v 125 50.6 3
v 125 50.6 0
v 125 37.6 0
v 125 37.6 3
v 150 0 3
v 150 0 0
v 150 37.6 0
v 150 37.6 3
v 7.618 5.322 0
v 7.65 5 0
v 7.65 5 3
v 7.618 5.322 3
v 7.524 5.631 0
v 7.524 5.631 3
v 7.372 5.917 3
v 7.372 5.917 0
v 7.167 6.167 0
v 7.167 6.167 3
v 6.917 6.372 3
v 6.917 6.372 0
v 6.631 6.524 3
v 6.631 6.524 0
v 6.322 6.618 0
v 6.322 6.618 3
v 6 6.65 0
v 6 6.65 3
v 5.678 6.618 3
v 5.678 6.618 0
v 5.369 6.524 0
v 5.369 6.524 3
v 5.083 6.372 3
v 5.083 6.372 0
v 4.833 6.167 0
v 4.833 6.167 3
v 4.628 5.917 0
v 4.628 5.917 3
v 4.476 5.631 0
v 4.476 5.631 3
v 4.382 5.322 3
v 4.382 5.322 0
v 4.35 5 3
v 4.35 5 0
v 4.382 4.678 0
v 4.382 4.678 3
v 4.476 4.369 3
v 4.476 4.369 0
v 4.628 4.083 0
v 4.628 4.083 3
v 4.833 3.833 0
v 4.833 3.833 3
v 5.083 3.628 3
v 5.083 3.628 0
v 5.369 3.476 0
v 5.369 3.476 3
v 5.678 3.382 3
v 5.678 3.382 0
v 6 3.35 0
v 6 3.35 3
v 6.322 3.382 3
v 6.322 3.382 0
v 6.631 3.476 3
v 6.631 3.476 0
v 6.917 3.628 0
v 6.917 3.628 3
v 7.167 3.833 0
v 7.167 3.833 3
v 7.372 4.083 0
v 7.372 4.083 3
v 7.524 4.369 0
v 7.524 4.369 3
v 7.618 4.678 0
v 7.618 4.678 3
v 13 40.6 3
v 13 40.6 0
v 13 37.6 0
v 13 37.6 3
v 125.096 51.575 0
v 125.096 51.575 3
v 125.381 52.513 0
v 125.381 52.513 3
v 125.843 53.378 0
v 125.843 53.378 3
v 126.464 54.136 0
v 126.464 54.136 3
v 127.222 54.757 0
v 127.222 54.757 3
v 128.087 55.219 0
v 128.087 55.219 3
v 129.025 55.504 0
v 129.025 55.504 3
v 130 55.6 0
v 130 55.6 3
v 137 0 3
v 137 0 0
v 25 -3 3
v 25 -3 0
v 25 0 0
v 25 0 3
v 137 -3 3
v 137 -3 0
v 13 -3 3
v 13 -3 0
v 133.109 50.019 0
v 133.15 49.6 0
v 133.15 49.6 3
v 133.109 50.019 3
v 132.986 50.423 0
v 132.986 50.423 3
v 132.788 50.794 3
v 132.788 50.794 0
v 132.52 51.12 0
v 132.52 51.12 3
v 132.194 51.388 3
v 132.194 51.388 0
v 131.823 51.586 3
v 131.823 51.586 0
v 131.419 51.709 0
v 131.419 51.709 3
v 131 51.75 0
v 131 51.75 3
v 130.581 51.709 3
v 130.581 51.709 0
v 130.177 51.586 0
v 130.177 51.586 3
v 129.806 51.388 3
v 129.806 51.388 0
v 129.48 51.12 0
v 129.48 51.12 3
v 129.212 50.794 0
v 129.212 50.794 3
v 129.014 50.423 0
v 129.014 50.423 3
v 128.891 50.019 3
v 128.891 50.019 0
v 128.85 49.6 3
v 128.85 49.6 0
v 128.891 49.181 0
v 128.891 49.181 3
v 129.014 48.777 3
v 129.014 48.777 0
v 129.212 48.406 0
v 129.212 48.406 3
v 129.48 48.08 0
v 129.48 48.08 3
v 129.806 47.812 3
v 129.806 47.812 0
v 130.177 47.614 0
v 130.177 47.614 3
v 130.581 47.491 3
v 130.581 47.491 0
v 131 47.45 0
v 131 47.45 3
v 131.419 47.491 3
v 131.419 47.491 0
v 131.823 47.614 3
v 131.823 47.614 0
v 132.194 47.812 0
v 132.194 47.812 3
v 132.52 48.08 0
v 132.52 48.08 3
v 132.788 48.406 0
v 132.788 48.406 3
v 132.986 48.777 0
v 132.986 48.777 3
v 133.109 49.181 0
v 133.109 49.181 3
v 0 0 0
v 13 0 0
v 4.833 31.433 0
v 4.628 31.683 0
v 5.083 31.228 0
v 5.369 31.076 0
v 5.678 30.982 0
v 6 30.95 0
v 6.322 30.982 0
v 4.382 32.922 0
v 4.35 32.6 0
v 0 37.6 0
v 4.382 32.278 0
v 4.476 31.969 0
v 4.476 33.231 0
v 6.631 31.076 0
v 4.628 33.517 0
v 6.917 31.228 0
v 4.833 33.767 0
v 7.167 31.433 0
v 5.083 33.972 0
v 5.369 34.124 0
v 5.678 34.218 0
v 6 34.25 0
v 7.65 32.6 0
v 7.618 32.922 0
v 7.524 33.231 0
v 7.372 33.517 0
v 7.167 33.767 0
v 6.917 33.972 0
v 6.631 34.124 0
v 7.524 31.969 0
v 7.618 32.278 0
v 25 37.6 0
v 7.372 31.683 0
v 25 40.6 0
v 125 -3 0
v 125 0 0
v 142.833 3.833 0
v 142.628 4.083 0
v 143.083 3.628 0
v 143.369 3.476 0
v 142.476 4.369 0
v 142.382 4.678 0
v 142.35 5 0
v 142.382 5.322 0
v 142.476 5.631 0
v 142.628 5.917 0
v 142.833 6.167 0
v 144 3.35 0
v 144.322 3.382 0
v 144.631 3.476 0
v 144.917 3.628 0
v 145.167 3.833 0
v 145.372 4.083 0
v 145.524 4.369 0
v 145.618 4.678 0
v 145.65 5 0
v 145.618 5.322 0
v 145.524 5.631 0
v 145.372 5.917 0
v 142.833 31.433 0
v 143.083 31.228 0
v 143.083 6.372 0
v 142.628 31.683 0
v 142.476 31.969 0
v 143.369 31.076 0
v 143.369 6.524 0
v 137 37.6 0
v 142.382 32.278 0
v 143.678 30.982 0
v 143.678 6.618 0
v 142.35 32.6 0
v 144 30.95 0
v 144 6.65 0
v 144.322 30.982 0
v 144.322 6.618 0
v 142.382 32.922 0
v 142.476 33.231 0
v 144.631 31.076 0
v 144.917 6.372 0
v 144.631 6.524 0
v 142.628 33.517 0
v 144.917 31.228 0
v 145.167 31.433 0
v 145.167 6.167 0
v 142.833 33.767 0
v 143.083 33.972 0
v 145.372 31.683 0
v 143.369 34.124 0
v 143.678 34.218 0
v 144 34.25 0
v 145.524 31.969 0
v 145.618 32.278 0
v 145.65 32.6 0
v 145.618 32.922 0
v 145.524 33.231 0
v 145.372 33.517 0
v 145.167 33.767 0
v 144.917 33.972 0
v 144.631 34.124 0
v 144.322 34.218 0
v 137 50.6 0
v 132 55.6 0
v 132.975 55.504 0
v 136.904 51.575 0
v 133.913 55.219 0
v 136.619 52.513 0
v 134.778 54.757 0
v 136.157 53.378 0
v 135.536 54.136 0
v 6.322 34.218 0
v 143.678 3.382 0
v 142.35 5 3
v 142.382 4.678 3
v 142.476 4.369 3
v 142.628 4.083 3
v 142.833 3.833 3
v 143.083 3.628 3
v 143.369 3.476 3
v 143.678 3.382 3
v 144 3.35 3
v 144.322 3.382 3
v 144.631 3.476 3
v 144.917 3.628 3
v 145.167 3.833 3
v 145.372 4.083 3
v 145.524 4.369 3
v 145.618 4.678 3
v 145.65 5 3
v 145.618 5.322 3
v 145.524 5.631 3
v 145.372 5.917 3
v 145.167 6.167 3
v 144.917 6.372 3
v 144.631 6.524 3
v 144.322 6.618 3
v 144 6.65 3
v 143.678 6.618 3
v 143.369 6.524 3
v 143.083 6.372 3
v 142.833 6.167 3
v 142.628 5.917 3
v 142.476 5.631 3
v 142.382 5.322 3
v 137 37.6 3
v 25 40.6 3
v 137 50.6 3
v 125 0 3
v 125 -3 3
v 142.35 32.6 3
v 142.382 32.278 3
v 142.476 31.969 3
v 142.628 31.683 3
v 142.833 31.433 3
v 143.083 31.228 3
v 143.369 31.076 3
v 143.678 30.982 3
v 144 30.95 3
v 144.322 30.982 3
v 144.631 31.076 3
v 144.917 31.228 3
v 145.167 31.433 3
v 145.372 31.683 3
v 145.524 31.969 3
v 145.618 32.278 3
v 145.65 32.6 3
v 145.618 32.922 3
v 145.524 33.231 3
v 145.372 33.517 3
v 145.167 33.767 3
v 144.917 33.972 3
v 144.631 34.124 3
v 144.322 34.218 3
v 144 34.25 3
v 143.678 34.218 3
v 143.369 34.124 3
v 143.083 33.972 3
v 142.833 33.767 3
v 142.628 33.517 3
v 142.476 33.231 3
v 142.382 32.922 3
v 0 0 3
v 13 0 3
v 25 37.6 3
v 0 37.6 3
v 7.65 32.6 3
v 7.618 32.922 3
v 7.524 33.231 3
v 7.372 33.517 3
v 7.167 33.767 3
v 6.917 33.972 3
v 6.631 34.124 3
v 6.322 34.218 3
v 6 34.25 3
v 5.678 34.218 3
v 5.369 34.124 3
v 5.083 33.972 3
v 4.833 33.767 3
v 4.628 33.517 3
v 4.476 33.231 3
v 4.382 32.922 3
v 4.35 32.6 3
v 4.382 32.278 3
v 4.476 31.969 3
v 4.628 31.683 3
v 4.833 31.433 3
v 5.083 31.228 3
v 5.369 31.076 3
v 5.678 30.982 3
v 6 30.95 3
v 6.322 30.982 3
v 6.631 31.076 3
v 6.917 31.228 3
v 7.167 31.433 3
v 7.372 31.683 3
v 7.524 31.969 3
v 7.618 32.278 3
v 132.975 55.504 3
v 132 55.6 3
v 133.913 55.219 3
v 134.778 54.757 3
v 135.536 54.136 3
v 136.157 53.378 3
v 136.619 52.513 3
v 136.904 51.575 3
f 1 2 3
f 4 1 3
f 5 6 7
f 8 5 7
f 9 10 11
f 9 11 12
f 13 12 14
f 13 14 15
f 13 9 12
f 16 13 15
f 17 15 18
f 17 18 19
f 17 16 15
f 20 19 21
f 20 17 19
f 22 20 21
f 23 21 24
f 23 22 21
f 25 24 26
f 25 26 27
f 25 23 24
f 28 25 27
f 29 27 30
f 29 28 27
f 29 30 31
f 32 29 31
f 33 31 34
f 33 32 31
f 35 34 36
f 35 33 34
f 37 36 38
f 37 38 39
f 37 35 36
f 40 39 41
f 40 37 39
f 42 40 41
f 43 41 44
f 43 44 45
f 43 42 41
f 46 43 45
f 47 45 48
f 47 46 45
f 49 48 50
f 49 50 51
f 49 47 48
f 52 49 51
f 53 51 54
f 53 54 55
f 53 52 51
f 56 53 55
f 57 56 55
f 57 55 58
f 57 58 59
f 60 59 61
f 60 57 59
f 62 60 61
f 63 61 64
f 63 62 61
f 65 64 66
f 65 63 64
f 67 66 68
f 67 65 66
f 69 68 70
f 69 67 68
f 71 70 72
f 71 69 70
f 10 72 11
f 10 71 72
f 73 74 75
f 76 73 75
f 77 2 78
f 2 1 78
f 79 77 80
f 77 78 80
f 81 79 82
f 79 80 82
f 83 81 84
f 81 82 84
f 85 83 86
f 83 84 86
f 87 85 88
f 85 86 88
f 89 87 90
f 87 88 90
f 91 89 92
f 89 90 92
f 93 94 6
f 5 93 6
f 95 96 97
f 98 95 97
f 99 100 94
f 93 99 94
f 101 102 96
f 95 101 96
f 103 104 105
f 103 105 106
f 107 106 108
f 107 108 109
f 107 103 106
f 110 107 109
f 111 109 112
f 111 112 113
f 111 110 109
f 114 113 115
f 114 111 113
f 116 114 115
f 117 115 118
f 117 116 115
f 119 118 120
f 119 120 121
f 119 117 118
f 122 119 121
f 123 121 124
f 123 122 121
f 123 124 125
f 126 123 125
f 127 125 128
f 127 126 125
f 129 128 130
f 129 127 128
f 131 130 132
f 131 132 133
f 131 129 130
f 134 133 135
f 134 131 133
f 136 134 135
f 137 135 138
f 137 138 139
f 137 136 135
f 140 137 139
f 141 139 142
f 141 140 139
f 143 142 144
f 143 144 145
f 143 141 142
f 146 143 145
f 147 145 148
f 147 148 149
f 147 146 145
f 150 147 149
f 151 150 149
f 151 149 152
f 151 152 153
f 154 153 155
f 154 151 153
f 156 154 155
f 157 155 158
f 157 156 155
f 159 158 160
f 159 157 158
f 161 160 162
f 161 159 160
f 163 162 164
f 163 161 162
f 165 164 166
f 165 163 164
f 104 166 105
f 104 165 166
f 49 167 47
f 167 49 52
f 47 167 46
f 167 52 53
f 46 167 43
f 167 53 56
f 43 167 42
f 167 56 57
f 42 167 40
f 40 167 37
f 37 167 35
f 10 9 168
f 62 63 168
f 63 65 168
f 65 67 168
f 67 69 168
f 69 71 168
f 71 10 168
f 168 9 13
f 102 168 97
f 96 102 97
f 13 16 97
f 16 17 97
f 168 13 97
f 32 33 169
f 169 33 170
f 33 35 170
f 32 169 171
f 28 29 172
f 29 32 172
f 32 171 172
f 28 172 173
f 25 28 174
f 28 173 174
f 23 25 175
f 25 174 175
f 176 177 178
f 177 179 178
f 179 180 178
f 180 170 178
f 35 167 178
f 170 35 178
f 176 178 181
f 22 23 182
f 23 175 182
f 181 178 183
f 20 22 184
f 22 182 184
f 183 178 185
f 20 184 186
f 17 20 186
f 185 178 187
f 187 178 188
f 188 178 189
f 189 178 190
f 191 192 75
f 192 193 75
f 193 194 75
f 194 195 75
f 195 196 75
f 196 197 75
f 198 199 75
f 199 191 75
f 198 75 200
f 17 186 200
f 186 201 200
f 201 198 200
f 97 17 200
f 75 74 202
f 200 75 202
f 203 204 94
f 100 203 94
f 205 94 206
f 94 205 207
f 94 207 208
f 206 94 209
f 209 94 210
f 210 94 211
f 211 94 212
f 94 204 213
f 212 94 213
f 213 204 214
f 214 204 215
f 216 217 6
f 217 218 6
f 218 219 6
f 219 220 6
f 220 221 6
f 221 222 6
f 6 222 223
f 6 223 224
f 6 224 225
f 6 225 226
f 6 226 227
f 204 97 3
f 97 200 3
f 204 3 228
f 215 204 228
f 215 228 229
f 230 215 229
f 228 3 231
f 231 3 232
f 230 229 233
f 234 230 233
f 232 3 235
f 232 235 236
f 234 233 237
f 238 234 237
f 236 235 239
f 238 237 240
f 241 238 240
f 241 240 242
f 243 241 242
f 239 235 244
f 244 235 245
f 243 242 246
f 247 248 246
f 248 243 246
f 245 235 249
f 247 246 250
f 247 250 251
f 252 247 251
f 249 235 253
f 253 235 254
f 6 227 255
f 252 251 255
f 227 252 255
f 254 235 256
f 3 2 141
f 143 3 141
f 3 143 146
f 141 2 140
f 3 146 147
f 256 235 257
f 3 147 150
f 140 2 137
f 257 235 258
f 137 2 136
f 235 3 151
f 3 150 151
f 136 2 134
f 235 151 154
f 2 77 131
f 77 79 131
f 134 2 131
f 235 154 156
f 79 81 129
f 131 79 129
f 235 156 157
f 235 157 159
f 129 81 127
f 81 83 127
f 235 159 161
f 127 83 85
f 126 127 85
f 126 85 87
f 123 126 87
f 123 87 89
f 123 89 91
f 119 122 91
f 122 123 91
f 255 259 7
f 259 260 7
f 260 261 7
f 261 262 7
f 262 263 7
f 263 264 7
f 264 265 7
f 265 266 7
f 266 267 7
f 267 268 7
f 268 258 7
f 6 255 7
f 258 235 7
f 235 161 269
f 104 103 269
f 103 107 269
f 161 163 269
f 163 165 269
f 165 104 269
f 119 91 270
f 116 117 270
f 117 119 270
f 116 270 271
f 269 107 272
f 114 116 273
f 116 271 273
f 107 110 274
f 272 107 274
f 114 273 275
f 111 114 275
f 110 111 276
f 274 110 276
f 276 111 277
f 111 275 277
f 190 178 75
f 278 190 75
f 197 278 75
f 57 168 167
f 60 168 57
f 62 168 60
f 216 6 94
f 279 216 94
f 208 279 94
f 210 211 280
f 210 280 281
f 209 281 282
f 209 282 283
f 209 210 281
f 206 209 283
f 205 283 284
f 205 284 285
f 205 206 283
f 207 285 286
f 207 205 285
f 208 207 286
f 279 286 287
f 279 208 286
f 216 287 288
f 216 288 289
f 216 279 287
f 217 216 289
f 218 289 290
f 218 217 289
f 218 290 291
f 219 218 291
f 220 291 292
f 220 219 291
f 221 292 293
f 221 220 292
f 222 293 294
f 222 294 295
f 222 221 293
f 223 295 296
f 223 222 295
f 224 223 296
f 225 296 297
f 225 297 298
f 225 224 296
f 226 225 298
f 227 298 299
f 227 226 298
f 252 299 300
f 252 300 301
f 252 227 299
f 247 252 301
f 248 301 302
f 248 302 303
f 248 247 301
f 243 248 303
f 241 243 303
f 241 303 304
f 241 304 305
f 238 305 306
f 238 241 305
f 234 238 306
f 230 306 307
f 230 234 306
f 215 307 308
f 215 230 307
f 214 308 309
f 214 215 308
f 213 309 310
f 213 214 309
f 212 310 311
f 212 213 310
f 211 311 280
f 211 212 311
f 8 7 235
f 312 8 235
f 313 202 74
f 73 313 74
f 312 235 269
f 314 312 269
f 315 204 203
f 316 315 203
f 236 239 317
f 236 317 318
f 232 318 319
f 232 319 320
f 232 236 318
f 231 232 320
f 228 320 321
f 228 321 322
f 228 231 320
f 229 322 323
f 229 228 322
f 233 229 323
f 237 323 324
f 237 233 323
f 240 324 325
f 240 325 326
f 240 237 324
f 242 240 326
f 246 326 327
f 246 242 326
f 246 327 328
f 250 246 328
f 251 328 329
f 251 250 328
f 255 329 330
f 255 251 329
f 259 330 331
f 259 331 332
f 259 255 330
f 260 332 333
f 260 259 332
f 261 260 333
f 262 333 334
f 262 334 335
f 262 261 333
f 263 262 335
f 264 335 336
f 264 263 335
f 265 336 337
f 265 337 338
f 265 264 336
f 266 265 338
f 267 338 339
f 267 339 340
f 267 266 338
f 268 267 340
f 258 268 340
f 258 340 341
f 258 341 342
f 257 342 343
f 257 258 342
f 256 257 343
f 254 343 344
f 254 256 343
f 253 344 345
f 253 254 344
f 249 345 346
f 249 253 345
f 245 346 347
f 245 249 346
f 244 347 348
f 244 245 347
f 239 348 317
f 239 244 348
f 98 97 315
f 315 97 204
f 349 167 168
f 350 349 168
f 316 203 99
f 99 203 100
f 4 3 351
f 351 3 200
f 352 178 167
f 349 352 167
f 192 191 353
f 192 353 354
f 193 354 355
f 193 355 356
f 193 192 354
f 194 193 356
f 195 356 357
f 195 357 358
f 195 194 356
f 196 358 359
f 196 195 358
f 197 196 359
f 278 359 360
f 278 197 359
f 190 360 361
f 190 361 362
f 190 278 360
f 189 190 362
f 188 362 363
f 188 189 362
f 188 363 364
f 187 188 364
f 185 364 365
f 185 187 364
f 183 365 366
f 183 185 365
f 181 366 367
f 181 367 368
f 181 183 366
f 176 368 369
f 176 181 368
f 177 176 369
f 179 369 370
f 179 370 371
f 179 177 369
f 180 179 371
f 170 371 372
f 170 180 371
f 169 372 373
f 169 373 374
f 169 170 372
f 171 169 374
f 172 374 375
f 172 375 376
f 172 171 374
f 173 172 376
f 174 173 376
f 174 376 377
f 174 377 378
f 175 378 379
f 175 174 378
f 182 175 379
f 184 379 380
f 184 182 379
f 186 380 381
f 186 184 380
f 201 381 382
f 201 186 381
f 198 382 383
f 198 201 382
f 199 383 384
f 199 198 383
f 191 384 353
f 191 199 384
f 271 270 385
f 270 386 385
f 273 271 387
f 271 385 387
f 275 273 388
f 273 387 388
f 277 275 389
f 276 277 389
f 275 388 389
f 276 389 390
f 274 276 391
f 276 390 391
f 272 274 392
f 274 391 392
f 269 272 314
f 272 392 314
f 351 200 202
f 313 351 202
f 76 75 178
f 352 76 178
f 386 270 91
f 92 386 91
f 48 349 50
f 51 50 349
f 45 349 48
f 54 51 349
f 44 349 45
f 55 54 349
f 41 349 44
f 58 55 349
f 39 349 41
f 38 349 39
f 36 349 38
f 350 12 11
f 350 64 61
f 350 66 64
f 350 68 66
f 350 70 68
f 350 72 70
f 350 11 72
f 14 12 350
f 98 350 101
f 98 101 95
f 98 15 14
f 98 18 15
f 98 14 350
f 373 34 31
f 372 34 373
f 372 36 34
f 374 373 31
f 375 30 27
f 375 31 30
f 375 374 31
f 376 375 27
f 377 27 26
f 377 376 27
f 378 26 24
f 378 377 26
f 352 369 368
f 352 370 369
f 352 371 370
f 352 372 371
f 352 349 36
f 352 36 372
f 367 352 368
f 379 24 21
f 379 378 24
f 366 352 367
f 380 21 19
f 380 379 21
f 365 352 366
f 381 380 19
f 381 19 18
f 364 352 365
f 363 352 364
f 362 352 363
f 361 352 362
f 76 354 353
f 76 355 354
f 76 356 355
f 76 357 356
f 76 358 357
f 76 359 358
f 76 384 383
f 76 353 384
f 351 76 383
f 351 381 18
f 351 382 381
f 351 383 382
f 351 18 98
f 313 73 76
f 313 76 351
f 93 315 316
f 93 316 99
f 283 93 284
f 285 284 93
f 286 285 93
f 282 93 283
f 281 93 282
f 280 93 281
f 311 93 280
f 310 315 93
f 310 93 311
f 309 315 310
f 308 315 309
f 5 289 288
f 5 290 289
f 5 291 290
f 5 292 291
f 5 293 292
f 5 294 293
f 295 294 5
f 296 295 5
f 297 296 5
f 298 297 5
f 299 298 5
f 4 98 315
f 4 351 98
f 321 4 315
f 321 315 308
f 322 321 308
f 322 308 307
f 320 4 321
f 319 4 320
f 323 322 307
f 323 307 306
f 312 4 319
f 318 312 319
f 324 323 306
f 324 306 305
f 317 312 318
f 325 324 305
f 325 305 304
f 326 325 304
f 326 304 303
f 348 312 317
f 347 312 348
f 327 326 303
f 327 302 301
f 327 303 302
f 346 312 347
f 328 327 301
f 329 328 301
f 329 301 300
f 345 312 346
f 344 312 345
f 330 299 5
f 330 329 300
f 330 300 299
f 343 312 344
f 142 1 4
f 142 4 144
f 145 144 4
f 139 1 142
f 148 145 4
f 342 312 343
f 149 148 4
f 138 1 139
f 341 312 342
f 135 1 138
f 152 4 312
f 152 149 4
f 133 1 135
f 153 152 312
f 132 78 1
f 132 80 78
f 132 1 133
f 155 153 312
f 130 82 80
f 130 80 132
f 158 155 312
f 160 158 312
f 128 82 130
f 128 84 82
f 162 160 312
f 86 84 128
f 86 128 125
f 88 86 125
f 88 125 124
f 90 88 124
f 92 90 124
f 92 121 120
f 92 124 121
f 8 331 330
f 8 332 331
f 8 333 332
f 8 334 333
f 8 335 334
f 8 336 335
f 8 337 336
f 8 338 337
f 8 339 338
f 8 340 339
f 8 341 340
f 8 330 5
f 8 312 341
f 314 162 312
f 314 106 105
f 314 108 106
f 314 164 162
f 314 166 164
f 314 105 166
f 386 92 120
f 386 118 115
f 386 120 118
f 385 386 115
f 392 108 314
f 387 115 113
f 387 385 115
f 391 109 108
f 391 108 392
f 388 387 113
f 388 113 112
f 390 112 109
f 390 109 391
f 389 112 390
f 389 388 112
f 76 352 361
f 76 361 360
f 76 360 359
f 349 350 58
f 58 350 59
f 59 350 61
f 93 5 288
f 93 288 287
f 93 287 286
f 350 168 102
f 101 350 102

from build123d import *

# Parameters (mm, degrees)
SKETCH_1_R      = 2.15
SKETCH_1_R_2    = 1.65
EXTRUDE_1_DEPTH = 3
FILLET_1_R      = 5


with BuildPart() as part:
    # 草图1 → 凸台-拉伸1 (new body)
    with BuildSketch(Plane.XY):
        Polygon((0, 0), (13, 0), (13, -3), (25, -3), (25, 0), (125, 0), (125, -3), (137, -3), (137, 0), (150, 0), (150, 37.6), (137, 37.6), (137, 40.6), (137, 55.6), (125, 55.6), (125, 40.6), (125, 37.6), (25, 37.6), (25, 40.6), (13, 40.6), (13, 37.6), (0, 37.6), align=None)
        with Locations((131, 49.6)):
            Circle(SKETCH_1_R, mode=Mode.SUBTRACT)
        with Locations((6, 32.6)):
            Circle(SKETCH_1_R_2, mode=Mode.SUBTRACT)
        with Locations((6, 5)):
            Circle(SKETCH_1_R_2, mode=Mode.SUBTRACT)
        with Locations(Location((144, 32.6, 0), (0, 0, 180))):
            Circle(SKETCH_1_R_2, mode=Mode.SUBTRACT)
        with Locations(Location((144, 5, 0), (0, 0, 180))):
            Circle(SKETCH_1_R_2, mode=Mode.SUBTRACT)
    extrude(amount=EXTRUDE_1_DEPTH)

    # 圆角1
    fillet_1_edges = [part.edges().sort_by_distance(p)[0] for p in [
        (125, 55.6, 1.5),
        (137, 55.6, 1.5),
    ]]
    fillet(fillet_1_edges, radius=FILLET_1_R)


solid = part.part
